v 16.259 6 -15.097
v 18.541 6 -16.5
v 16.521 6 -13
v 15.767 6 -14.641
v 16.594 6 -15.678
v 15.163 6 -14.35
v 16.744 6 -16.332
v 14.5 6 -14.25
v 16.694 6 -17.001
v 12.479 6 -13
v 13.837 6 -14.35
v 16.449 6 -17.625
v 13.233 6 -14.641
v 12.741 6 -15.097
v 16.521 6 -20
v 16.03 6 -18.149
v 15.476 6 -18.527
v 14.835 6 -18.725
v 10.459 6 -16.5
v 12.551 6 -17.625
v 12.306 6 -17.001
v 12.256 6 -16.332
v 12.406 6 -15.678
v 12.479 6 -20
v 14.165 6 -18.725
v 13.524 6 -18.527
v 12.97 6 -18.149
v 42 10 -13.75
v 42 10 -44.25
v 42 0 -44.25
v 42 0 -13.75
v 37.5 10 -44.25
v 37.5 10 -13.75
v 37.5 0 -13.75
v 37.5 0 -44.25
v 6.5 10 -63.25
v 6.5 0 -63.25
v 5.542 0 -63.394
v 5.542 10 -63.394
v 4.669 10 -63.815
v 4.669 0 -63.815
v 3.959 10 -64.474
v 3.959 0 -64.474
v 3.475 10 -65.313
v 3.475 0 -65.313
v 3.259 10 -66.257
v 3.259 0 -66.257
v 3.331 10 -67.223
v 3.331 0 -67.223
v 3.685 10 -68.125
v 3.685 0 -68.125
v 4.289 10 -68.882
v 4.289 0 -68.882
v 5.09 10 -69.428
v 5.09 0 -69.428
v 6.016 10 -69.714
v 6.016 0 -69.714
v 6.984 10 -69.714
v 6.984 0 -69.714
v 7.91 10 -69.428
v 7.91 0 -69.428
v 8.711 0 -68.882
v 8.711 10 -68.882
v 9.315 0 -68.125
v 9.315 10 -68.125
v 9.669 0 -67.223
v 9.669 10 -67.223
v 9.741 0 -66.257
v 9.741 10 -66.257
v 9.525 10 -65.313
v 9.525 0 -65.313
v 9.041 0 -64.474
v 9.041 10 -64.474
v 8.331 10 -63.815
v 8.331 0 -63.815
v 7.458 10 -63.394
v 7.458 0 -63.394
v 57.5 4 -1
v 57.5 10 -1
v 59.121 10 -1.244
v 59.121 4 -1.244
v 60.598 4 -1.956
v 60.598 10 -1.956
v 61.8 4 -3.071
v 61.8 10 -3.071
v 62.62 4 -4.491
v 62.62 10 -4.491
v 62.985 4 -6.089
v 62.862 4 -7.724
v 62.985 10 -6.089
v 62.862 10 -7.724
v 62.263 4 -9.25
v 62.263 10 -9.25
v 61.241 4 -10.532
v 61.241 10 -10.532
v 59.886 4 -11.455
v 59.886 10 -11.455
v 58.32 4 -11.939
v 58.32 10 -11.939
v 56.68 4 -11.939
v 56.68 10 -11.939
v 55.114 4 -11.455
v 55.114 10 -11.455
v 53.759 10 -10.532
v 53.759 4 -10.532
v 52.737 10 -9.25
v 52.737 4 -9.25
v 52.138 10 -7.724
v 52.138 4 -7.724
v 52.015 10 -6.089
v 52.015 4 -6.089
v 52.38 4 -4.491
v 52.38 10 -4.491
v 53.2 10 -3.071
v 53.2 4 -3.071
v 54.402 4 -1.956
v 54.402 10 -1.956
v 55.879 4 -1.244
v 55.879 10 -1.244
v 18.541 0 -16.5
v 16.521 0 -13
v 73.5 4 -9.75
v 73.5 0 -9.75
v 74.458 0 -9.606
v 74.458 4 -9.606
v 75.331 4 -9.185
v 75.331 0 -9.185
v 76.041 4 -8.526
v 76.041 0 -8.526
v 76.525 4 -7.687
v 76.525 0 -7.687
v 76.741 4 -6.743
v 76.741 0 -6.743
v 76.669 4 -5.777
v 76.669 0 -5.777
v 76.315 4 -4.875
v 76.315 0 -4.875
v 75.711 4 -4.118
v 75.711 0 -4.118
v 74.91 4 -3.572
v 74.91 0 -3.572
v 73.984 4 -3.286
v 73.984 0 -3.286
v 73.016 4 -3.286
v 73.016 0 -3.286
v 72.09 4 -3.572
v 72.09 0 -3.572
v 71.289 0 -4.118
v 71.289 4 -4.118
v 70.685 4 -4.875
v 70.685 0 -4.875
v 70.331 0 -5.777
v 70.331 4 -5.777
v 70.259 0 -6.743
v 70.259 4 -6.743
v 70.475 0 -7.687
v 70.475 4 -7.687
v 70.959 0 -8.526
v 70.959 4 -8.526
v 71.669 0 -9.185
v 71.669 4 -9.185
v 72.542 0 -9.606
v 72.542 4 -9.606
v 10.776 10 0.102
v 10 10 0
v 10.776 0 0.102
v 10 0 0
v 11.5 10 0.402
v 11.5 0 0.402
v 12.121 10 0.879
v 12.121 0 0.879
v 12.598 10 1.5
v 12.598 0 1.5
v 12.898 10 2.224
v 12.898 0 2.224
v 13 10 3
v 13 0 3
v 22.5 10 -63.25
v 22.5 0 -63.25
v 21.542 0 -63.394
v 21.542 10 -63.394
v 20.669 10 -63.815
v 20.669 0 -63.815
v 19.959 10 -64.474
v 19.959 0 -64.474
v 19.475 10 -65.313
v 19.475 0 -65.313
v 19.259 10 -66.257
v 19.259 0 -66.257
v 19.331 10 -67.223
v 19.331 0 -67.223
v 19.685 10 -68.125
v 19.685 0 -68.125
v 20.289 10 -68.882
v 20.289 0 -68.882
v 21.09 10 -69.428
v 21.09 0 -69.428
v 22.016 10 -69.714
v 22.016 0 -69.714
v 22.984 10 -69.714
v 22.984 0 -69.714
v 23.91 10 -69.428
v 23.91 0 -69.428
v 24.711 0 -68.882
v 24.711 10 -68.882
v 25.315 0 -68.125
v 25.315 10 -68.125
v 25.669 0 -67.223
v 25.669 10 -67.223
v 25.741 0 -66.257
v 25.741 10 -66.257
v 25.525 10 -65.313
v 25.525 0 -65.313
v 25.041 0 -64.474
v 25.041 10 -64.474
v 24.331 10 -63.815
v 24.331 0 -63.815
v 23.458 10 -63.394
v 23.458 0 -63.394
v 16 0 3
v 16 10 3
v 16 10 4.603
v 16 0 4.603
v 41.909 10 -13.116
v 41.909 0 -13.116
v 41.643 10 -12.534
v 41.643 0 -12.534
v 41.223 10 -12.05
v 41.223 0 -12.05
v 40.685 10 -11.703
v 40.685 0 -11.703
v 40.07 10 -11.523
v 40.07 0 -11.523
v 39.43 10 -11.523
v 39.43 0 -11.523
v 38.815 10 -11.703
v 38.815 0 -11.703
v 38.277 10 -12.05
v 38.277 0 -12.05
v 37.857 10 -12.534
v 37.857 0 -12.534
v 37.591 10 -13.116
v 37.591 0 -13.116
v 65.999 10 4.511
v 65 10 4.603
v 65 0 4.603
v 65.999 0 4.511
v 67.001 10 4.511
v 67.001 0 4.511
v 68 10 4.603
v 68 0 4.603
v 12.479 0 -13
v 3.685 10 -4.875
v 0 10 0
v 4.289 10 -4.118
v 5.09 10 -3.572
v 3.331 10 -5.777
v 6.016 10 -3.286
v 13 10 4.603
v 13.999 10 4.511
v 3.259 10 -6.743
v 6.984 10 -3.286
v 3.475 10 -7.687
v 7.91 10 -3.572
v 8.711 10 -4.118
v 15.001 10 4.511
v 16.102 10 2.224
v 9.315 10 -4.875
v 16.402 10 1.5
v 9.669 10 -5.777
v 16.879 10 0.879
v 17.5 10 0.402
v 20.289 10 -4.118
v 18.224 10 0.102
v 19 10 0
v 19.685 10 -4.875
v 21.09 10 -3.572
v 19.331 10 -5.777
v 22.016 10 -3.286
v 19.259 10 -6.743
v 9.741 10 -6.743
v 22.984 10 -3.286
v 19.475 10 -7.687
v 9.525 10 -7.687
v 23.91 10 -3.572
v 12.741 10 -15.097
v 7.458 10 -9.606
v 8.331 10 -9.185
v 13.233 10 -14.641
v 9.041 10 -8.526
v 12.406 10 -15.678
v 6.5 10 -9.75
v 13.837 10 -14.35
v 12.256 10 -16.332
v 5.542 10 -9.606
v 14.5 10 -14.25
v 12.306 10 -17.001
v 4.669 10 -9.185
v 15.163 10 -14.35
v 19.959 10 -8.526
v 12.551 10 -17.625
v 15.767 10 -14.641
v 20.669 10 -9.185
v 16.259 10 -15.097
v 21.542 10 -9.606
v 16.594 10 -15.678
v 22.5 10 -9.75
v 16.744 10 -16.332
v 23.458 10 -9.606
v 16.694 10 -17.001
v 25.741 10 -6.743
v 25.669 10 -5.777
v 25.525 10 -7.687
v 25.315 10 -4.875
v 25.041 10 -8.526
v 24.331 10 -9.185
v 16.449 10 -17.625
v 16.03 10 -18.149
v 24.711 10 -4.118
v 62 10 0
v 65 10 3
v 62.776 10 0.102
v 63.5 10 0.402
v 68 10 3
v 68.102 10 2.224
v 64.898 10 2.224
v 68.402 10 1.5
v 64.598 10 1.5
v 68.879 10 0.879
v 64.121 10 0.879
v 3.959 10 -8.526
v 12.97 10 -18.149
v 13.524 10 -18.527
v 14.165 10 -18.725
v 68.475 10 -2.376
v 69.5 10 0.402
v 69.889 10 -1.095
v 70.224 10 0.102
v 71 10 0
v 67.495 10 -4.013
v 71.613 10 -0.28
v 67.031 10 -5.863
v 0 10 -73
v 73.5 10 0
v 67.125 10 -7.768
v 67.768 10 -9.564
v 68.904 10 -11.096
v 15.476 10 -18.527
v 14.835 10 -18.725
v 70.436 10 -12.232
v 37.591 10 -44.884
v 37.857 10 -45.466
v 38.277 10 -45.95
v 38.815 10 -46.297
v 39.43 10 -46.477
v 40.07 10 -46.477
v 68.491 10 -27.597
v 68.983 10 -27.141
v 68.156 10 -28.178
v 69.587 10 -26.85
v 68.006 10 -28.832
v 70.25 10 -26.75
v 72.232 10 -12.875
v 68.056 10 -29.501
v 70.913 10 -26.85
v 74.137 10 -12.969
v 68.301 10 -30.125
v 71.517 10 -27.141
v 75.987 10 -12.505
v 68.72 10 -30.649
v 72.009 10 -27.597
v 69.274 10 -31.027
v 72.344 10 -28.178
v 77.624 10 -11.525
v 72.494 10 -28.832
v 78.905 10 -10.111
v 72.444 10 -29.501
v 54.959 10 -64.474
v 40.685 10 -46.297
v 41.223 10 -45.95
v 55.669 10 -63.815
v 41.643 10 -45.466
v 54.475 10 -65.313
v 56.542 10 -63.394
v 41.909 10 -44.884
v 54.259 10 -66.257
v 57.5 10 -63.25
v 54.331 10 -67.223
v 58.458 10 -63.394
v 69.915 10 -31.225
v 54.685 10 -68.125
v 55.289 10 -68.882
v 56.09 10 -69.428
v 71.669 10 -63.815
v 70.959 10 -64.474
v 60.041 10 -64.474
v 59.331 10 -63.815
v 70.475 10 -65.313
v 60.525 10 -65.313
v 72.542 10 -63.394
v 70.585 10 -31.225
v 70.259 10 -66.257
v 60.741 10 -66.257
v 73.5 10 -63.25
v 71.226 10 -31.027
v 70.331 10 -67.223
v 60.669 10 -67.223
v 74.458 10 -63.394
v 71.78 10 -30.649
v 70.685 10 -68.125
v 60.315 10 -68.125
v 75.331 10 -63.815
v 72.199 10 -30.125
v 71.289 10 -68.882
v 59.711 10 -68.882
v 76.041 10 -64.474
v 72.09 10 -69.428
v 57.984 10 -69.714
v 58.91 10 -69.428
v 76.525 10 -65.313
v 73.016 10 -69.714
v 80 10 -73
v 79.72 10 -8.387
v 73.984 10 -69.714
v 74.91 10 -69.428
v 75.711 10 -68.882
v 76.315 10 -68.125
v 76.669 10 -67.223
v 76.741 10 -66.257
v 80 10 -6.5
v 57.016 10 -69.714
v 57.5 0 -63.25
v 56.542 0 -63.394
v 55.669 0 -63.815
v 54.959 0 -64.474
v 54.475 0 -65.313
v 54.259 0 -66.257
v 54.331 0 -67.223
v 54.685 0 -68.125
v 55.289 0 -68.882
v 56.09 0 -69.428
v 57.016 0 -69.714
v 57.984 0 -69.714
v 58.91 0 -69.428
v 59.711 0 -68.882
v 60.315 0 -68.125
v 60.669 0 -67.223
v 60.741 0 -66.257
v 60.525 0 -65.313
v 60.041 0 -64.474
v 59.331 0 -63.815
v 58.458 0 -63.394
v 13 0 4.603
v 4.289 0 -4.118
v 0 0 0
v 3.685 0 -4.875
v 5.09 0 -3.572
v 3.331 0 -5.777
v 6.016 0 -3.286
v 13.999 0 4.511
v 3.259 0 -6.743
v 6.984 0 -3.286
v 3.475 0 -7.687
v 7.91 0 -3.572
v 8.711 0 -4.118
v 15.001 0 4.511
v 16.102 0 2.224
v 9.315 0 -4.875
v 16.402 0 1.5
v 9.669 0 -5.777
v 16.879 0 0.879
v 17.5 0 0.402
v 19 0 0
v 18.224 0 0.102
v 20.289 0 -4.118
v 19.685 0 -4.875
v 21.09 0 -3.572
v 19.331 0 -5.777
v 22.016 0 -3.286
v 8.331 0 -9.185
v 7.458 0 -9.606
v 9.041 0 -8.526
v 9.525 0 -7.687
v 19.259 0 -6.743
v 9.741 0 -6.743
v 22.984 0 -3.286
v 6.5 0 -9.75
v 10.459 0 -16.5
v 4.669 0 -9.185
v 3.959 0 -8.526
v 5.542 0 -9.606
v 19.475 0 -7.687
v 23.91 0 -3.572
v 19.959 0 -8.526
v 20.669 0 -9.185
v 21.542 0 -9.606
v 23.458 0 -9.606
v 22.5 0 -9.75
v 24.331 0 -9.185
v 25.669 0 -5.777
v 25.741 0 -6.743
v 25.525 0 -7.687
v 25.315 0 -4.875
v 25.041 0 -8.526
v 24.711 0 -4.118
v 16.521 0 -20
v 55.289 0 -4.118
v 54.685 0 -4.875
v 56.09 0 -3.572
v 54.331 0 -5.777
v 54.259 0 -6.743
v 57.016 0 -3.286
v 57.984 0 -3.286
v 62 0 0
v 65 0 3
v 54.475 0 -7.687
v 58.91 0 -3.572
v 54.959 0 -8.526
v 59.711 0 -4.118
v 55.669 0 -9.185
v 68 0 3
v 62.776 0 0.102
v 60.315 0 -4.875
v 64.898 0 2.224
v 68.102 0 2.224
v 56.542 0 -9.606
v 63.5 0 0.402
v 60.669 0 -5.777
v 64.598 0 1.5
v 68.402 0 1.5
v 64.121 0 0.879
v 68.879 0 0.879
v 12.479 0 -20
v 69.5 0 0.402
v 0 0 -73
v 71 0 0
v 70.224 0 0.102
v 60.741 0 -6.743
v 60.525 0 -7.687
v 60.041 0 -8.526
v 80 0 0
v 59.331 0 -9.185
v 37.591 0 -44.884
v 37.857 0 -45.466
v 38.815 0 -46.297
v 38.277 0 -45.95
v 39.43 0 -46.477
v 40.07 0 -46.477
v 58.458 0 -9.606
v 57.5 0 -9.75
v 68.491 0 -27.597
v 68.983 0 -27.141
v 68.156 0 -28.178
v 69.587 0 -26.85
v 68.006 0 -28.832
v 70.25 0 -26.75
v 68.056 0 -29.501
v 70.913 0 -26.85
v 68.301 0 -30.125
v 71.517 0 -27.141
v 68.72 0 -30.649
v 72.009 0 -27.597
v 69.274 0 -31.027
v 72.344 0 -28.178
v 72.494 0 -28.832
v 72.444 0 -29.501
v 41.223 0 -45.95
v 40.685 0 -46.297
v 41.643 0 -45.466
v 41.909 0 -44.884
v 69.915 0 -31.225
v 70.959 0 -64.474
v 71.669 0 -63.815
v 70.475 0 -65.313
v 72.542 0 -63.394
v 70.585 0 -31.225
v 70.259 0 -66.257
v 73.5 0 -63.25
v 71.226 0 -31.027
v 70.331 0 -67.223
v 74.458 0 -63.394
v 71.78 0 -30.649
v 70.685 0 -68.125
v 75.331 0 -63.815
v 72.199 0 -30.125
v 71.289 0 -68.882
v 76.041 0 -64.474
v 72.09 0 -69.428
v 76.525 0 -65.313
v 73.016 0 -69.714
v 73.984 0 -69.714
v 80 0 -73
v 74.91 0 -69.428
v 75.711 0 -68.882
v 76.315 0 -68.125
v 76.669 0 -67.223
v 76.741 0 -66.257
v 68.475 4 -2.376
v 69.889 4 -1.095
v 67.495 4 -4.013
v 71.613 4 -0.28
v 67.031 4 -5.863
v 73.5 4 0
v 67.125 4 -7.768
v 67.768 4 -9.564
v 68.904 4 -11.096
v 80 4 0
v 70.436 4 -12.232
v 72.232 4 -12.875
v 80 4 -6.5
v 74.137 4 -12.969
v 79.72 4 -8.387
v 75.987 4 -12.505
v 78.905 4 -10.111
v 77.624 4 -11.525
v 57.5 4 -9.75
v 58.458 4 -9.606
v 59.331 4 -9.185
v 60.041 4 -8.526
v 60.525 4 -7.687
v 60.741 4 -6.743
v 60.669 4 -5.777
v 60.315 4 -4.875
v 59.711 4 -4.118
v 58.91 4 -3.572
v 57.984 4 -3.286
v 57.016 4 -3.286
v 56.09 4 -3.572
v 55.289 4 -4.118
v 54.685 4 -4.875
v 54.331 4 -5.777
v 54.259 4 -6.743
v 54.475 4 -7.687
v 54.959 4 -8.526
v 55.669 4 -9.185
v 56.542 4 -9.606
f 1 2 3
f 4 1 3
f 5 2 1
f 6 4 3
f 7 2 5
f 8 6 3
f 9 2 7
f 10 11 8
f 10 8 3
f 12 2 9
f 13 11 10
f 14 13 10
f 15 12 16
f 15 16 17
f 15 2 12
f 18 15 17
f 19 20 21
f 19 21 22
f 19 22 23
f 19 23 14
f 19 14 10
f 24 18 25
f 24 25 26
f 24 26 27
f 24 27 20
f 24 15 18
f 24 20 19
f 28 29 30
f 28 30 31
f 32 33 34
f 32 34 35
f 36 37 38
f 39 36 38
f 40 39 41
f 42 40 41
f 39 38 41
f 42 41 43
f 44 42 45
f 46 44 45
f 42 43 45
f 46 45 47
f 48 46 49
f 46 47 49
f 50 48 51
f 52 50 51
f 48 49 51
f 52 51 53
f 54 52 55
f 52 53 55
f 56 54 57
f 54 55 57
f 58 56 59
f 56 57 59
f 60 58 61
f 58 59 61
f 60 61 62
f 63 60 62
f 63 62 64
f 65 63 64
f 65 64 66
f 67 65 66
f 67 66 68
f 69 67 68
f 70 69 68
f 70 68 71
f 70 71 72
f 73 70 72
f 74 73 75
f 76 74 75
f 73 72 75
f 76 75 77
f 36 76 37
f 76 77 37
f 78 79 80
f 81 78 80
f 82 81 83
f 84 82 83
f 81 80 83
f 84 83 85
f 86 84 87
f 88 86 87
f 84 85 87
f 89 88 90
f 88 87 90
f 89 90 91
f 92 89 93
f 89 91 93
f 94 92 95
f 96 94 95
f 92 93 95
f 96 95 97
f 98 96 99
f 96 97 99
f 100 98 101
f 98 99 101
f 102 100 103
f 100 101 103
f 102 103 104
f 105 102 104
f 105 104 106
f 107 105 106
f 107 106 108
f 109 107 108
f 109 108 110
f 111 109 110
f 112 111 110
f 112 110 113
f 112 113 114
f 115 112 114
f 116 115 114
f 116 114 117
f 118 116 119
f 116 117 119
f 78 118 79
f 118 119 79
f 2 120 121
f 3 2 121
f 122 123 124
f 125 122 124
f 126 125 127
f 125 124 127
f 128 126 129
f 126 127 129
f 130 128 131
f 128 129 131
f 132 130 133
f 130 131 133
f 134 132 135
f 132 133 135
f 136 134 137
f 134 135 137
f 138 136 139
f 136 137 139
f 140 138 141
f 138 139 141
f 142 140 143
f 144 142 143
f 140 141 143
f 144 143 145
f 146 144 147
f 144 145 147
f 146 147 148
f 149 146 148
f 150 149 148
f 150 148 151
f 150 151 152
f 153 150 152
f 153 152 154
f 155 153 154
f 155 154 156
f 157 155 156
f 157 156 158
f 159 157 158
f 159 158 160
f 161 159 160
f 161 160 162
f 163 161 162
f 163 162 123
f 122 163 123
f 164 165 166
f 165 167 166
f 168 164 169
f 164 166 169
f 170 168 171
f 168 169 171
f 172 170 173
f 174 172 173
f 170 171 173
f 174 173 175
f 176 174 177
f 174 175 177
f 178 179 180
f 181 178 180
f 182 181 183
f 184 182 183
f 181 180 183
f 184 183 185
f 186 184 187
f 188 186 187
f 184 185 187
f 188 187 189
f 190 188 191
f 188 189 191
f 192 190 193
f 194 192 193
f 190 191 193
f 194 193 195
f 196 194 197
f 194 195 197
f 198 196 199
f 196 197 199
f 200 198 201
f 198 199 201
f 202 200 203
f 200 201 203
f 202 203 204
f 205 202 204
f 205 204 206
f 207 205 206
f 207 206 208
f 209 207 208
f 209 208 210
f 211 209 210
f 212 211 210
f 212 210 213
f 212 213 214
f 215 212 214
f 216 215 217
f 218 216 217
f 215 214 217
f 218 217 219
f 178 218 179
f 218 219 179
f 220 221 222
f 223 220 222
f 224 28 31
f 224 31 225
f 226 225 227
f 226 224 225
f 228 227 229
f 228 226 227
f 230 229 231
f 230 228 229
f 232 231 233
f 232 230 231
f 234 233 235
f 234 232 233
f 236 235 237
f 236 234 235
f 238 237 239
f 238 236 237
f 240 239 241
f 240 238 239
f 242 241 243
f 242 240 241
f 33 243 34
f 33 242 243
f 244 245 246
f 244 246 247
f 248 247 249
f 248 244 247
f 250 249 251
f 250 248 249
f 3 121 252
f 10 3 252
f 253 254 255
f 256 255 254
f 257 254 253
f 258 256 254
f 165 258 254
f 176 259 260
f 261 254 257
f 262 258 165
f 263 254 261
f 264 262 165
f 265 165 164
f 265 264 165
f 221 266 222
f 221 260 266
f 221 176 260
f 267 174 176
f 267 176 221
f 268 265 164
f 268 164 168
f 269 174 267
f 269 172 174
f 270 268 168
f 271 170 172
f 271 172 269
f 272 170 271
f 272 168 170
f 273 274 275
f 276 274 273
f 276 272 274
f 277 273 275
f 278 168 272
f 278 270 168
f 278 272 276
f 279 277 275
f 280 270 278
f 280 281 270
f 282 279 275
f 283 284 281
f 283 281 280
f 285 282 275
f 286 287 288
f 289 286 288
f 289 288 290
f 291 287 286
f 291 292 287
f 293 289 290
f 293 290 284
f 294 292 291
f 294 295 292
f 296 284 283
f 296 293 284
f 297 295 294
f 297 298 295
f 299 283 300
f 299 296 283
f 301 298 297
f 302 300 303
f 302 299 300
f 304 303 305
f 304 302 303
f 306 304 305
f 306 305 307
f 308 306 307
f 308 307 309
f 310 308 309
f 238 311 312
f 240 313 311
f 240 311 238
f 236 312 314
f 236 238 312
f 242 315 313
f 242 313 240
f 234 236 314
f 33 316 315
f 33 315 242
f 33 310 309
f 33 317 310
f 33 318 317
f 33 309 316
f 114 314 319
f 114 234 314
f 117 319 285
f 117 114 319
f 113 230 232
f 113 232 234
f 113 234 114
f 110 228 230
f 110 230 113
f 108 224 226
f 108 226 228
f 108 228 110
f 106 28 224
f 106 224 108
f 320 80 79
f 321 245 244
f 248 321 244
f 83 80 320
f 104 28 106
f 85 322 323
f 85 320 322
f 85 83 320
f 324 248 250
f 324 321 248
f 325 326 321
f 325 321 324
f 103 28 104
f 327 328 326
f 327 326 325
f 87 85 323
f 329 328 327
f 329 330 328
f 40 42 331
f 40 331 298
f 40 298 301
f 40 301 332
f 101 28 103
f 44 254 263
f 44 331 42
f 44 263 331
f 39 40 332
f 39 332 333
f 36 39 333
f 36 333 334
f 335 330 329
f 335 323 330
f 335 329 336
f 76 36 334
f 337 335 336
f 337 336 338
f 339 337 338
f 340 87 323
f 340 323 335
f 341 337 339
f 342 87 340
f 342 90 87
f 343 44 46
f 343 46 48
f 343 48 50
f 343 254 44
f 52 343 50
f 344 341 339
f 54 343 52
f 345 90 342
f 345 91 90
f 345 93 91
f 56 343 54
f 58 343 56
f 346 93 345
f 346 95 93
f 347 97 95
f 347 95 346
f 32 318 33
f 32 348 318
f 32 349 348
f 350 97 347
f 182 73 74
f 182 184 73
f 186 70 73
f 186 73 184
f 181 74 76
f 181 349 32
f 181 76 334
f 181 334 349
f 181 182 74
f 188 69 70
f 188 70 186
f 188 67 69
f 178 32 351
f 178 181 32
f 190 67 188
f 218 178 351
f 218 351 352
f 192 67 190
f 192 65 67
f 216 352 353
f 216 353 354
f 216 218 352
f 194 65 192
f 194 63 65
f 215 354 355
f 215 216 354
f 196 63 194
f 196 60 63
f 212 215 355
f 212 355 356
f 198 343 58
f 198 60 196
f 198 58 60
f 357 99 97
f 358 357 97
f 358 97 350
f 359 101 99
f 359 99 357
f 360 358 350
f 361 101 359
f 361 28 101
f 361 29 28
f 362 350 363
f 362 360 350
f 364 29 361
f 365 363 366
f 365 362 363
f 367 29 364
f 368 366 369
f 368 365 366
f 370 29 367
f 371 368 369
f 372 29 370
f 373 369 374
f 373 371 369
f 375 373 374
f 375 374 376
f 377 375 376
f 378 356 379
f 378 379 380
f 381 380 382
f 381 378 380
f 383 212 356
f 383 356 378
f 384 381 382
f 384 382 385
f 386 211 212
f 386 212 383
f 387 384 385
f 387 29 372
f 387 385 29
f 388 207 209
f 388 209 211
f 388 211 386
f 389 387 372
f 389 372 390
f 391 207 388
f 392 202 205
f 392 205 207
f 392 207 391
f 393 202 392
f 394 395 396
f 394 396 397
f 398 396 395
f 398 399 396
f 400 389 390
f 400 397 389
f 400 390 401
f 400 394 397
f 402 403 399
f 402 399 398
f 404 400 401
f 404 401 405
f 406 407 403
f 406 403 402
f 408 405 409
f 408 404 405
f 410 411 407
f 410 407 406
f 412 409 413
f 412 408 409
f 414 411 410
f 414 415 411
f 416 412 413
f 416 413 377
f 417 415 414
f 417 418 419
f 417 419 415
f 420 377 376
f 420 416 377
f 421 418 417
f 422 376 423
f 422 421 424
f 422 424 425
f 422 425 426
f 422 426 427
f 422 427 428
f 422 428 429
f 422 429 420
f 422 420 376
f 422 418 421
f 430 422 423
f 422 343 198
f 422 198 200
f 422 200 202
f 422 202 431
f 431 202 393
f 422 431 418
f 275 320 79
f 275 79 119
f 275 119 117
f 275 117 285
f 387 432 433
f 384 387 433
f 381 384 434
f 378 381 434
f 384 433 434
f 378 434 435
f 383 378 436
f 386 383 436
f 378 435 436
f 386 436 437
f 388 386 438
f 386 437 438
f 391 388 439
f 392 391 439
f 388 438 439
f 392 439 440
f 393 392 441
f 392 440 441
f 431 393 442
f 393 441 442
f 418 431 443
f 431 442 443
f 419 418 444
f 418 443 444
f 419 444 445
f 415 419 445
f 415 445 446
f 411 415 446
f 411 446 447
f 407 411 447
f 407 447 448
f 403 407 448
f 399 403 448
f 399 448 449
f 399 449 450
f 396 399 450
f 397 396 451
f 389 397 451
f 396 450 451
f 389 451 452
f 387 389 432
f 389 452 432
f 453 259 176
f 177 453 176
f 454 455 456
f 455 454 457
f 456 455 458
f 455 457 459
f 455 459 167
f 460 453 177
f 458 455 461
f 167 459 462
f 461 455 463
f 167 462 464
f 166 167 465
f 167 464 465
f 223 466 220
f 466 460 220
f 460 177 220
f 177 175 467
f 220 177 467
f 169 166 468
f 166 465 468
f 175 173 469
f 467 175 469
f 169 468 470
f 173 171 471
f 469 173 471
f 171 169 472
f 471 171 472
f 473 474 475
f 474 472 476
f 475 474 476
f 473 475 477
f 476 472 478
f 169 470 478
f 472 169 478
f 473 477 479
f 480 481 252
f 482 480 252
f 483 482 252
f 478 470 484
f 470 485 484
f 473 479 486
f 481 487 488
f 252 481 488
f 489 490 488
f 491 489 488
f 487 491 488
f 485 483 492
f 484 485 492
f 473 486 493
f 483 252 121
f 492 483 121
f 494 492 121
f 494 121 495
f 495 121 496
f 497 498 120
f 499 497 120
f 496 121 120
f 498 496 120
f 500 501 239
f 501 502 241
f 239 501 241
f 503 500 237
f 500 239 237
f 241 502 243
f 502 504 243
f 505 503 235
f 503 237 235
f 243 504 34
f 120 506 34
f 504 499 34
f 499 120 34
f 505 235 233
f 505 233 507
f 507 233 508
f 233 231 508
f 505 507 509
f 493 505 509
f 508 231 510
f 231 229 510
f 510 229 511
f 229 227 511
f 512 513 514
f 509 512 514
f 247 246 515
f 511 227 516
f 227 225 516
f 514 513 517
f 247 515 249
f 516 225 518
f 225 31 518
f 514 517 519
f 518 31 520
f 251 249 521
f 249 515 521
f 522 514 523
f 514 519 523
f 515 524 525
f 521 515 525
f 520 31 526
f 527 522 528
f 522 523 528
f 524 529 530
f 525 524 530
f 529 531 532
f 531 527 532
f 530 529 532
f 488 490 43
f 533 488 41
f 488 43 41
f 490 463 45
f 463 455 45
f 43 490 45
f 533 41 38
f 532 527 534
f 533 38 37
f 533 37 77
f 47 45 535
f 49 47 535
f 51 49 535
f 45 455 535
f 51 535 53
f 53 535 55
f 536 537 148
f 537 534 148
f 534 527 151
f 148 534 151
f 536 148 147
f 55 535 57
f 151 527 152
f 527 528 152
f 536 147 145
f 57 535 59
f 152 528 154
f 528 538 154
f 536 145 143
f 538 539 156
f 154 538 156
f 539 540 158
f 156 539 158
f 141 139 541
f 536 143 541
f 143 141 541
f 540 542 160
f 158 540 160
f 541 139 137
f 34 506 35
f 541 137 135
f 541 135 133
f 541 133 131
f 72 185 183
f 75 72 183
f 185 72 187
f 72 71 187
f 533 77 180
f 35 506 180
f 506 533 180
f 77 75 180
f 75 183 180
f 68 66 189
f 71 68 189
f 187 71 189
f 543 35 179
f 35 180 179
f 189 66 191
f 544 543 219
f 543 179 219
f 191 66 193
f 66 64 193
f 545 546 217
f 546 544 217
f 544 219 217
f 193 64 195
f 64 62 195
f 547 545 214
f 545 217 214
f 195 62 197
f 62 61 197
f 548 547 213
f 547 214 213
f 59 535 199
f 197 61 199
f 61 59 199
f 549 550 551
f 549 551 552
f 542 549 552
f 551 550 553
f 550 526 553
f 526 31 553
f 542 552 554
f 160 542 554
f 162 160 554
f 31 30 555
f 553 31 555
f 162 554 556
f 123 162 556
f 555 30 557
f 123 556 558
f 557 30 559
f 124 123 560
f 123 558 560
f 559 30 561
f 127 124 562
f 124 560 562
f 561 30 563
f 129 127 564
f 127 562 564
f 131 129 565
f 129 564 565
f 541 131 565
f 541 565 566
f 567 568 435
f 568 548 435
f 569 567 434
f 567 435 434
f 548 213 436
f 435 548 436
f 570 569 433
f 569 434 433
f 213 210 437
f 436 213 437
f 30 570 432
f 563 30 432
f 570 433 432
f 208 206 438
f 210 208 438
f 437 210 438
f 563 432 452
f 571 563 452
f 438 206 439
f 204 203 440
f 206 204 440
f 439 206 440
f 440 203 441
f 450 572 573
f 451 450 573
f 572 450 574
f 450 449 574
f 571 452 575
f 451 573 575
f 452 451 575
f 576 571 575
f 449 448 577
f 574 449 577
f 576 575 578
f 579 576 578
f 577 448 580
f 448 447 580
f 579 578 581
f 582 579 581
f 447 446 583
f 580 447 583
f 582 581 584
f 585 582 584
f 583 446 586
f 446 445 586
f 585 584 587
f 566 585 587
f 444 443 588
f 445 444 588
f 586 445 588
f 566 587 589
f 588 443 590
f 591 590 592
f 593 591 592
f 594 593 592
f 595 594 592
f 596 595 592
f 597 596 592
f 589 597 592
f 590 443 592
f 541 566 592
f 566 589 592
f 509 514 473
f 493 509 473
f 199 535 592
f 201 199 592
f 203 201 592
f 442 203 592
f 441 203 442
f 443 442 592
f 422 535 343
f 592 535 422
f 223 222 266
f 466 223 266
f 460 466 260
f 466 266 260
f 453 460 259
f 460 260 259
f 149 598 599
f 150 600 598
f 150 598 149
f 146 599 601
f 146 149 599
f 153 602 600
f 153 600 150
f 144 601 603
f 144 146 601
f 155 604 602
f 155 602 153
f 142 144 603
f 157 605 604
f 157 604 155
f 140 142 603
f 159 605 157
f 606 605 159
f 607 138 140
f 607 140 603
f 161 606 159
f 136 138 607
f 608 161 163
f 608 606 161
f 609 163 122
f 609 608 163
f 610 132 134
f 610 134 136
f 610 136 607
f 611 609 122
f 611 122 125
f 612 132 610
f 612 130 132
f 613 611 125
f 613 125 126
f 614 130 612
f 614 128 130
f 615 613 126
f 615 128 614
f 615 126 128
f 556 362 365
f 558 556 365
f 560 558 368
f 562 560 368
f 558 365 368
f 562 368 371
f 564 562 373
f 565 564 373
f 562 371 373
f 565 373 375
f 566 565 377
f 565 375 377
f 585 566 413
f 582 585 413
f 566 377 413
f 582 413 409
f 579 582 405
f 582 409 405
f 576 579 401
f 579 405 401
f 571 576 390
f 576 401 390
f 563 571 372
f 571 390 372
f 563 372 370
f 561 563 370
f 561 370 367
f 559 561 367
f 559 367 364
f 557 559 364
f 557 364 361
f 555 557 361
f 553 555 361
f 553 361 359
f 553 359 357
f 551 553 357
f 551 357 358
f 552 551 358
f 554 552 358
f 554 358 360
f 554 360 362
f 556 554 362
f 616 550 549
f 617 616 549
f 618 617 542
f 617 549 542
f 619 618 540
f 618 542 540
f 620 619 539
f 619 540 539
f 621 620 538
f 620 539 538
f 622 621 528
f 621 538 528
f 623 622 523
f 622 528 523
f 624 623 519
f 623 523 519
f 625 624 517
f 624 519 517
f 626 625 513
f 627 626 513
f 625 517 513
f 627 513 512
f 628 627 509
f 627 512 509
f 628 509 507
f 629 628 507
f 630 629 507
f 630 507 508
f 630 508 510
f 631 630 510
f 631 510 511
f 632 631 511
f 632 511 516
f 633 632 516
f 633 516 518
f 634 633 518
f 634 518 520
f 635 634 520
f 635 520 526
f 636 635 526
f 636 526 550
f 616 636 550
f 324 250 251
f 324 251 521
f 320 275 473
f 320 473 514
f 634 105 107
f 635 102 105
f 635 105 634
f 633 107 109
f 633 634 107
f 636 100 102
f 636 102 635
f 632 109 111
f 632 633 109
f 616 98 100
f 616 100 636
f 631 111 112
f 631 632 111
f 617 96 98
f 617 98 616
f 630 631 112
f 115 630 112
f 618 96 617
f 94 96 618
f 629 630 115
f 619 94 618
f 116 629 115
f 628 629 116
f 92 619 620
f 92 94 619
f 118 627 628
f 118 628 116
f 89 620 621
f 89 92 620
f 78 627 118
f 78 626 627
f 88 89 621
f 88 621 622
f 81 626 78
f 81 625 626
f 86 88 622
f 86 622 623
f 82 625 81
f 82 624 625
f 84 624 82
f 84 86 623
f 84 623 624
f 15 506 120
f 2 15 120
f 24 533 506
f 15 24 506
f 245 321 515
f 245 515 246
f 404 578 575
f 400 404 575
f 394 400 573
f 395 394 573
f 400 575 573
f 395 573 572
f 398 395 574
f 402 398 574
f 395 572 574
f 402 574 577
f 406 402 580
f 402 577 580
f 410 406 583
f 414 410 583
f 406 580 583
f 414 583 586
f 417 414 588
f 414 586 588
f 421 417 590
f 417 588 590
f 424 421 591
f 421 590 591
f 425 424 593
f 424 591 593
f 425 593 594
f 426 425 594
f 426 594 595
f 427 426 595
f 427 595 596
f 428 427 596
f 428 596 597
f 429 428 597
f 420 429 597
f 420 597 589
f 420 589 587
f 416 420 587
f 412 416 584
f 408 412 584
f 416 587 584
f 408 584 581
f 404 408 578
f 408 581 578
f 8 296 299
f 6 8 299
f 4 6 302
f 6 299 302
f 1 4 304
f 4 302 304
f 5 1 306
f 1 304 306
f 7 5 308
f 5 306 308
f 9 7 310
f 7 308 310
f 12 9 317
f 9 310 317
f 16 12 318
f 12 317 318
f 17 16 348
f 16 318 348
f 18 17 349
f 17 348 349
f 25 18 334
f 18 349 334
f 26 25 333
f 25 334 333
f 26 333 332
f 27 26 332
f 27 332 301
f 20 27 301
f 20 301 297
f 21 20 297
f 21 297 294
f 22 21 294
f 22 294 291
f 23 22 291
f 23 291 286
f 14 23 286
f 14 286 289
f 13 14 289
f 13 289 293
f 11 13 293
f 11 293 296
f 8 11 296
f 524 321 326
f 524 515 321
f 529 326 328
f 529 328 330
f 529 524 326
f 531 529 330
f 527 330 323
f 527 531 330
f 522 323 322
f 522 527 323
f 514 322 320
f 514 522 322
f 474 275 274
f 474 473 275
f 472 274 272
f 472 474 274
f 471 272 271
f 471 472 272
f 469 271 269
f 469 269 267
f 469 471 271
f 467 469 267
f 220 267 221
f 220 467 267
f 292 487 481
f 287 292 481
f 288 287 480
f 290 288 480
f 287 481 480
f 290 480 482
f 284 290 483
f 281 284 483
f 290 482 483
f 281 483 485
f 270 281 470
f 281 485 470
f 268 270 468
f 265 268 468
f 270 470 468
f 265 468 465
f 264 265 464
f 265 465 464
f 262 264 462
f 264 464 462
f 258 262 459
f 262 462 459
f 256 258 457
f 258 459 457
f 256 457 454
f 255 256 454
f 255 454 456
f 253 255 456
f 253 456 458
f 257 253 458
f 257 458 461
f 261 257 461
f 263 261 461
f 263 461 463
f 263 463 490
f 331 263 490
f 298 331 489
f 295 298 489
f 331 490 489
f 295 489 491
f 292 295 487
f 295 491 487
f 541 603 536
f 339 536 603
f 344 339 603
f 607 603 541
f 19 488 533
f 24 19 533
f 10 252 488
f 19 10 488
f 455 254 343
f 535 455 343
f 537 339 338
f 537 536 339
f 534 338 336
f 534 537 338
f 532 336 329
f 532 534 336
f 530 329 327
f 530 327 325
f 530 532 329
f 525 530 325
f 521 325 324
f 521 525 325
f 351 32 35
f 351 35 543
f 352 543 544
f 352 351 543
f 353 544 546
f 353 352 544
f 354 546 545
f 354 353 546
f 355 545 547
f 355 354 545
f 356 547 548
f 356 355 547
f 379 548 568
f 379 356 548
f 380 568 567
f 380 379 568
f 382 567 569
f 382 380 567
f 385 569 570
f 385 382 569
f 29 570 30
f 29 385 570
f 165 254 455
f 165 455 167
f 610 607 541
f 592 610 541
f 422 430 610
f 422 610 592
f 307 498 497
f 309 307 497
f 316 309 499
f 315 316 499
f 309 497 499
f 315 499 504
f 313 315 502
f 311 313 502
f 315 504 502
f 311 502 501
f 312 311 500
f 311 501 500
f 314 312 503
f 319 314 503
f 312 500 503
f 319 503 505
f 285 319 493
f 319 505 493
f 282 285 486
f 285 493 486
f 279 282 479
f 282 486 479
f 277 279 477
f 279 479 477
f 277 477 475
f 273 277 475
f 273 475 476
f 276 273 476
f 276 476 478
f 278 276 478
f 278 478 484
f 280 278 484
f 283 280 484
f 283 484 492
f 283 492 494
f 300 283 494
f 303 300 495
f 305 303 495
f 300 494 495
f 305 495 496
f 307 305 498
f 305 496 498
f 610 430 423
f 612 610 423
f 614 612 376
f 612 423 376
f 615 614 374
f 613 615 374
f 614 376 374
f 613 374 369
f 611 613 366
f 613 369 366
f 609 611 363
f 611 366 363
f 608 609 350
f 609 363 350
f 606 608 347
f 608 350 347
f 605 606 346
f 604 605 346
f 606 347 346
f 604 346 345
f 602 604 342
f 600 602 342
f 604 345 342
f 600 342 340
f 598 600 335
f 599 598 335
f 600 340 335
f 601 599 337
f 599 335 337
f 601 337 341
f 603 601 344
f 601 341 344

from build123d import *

# Parameters (mm, degrees)
SKETCH1_W           = 80
SKETCH1_H           = 73
BOSS_EXTRUDE1_DEPTH = 10
SKETCH3_R           = 3.25
CUT_EXTRUDE1_DEPTH  = 10
SKETCH4_W           = 80
SKETCH4_H           = 30
SKETCH4_R           = 11.5
BOSS_EXTRUDE2_DEPTH = 10
BOSS_EXTRUDE3_START = 6
SKETCH5_W           = 80
SKETCH5_H           = 29.5
SKETCH5_R           = 11.5
BOSS_EXTRUDE3_DEPTH = 6
SKETCH6_R           = 2.25
CUT_EXTRUDE2_DEPTH  = 28
SKETCH7_W           = 80
SKETCH7_H           = 30
CUT_EXTRUDE3_DEPTH  = 20
BOSS_EXTRUDE4_DEPTH = 10
SKETCH9_R           = 5.5
CUT_EXTRUDE4_DEPTH  = 6
FILLET1_R           = 3
SKETCH10_R          = 2.25
CUT_EXTRUDE5_DEPTH  = 16
CUT_EXTRUDE6_DEPTH  = 6


with BuildPart() as part:
    # Sketch1 → Boss-Extrude1 (new body)
    with BuildSketch(Plane(origin=(0, 0, 0), x_dir=(1, 0, 0), z_dir=(0, 1, 0))):
        with Locations((40, 36.5)):
            Rectangle(SKETCH1_W, SKETCH1_H)
    extrude(amount=BOSS_EXTRUDE1_DEPTH)

    # Sketch3 → Cut-Extrude1 (cut)
    with BuildSketch(Plane(origin=(0, 0, 0), x_dir=(-1, 0, 0), z_dir=(0, -1, 0))):
        with Locations(Location((-6.5, 6.5, 0), (0, 0, 90))):
            Circle(SKETCH3_R)
        with Locations(Location((-22.5, 6.5, 0), (0, 0, 90))):
            Circle(SKETCH3_R)
        with Locations(Location((-57.5, 6.5, 0), (0, 0, 90))):
            Circle(SKETCH3_R)
        with Locations(Location((-73.5, 6.5, 0), (0, 0, 90))):
            Circle(SKETCH3_R)
        with Locations(Location((-73.5, 66.5, 0), (0, 0, 270))):
            Circle(SKETCH3_R)
        with Locations(Location((-57.5, 66.5, 0), (0, 0, 270))):
            Circle(SKETCH3_R)
        with Locations(Location((-22.5, 66.5, 0), (0, 0, 270))):
            Circle(SKETCH3_R)
        with Locations(Location((-6.5, 66.5, 0), (0, 0, 270))):
            Circle(SKETCH3_R)
    extrude(amount=-CUT_EXTRUDE1_DEPTH, mode=Mode.SUBTRACT)

    # Sketch4 → Boss-Extrude2 (add)
    with BuildSketch(Plane(origin=(0, 10, 0), x_dir=(1, 0, 0), z_dir=(0, 1, 0))):
        with Locations((40, -15)):
            Rectangle(SKETCH4_W, SKETCH4_H)
        with Locations(Location((14, -14, 0), (0, 0, 270))):
            Circle(SKETCH4_R, mode=Mode.SUBTRACT)
        with Locations(Location((66, -14, 0), (0, 0, 270))):
            Circle(SKETCH4_R, mode=Mode.SUBTRACT)
    extrude(amount=-BOSS_EXTRUDE2_DEPTH)

    # Sketch5 → Boss-Extrude3 (add)
    with BuildSketch(Plane(origin=(0, 10, 0), x_dir=(1, 0, 0), z_dir=(0, 1, 0)).offset(BOSS_EXTRUDE3_START)):
        with Locations((40, -15.25)):
            Rectangle(SKETCH5_W, SKETCH5_H)
        with Locations(Location((14, -14, 0), (0, 0, 270))):
            Circle(SKETCH5_R, mode=Mode.SUBTRACT)
        with Locations(Location((66, -14, 0), (0, 0, 270))):
            Circle(SKETCH5_R, mode=Mode.SUBTRACT)
    extrude(amount=-BOSS_EXTRUDE3_DEPTH)

    # Sketch6 → Cut-Extrude2 (cut)
    with BuildSketch(Plane(origin=(0, 10, 0), x_dir=(1, 0, 0), z_dir=(0, 1, 0))):
        with Locations(Location((70.25, 29, 0), (0, 0, 270))):
            Circle(SKETCH6_R)
        with BuildLine():
            Line((37.5, 13.75), (37.5, 44.25))
            ThreePointArc((37.5, 44.25), (39.75, 46.5), (42, 44.25))
            Line((42, 44.25), (42, 13.75))
            ThreePointArc((42, 13.75), (39.75, 11.5), (37.5, 13.75))
        make_face()
    extrude(amount=-CUT_EXTRUDE2_DEPTH, mode=Mode.SUBTRACT)

    # Sketch7 → Cut-Extrude3 (cut)
    with BuildSketch(Plane(origin=(0, 16, 0), x_dir=(1, 0, 0), z_dir=(0, 1, 0))):
        with Locations((40, -15)):
            Rectangle(SKETCH7_W, SKETCH7_H)
    extrude(amount=-CUT_EXTRUDE3_DEPTH, mode=Mode.SUBTRACT)

    # Sketch8 → Boss-Extrude4 (add)
    with BuildSketch(Plane(origin=(0, 10, 0), x_dir=(1, 0, 0), z_dir=(0, 1, 0))):
        with BuildLine():
            Line((13, -4.602752641), (13, 0))
            Line((13, 0), (16, 0))
            Line((16, 0), (16, -4.602752641))
            ThreePointArc((16, -4.602752641), (14.5, -4.5), (13, -4.602752641))
        make_face()
        with BuildLine():
            Line((65, 0), (65, -4.602752641))
            ThreePointArc((65, -4.602752641), (66.5, -4.5), (68, -4.602752641))
            Line((68, -4.602752641), (68, 0))
            Line((68, 0), (65, 0))
        make_face()
    extrude(amount=-BOSS_EXTRUDE4_DEPTH)

    # Sketch9 → Cut-Extrude4 (cut)
    with BuildSketch(Plane(origin=(0, 10, 0), x_dir=(1, 0, 0), z_dir=(0, 1, 0))):
        with Locations(Location((57.5, 6.5, 0), (0, 0, 270))):
            Circle(SKETCH9_R)
        with BuildLine():
            Line((73.5, 0), (80, 0))
            Line((80, 0), (80, 6.5))
            ThreePointArc((80, 6.5), (68.903805922, 11.096194078), (73.5, 0))
        make_face()
    extrude(amount=-CUT_EXTRUDE4_DEPTH, mode=Mode.SUBTRACT)

    # Fillet1
    fillet1_edges = [part.edges().sort_by_distance(p)[0] for p in [
        (13, 5, 0),
        (16, 5, 0),
        (65, 5, 0),
        (68, 5, 0),
    ]]
    fillet(fillet1_edges, radius=FILLET1_R)

    # Sketch10 → Cut-Extrude5 (cut)
    with BuildSketch(Plane(origin=(0, 10, 0), x_dir=(1, 0, 0), z_dir=(0, 1, 0))):
        with Locations(Location((14.5, 16.5, 0), (0, 0, 270))):
            Circle(SKETCH10_R)
    extrude(amount=-CUT_EXTRUDE5_DEPTH, mode=Mode.SUBTRACT)

    # Sketch11 → Cut-Extrude6 (cut)
    with BuildSketch(Plane(origin=(0, 0, 0), x_dir=(-1, 0, 0), z_dir=(0, -1, 0))):
        Polygon((-10.458548116, 16.5), (-12.479274058, 20), (-16.520725942, 20), (-18.541451884, 16.5), (-16.520725942, 13), (-12.479274058, 13), align=None)
    extrude(amount=-CUT_EXTRUDE6_DEPTH, mode=Mode.SUBTRACT)


solid = part.part
